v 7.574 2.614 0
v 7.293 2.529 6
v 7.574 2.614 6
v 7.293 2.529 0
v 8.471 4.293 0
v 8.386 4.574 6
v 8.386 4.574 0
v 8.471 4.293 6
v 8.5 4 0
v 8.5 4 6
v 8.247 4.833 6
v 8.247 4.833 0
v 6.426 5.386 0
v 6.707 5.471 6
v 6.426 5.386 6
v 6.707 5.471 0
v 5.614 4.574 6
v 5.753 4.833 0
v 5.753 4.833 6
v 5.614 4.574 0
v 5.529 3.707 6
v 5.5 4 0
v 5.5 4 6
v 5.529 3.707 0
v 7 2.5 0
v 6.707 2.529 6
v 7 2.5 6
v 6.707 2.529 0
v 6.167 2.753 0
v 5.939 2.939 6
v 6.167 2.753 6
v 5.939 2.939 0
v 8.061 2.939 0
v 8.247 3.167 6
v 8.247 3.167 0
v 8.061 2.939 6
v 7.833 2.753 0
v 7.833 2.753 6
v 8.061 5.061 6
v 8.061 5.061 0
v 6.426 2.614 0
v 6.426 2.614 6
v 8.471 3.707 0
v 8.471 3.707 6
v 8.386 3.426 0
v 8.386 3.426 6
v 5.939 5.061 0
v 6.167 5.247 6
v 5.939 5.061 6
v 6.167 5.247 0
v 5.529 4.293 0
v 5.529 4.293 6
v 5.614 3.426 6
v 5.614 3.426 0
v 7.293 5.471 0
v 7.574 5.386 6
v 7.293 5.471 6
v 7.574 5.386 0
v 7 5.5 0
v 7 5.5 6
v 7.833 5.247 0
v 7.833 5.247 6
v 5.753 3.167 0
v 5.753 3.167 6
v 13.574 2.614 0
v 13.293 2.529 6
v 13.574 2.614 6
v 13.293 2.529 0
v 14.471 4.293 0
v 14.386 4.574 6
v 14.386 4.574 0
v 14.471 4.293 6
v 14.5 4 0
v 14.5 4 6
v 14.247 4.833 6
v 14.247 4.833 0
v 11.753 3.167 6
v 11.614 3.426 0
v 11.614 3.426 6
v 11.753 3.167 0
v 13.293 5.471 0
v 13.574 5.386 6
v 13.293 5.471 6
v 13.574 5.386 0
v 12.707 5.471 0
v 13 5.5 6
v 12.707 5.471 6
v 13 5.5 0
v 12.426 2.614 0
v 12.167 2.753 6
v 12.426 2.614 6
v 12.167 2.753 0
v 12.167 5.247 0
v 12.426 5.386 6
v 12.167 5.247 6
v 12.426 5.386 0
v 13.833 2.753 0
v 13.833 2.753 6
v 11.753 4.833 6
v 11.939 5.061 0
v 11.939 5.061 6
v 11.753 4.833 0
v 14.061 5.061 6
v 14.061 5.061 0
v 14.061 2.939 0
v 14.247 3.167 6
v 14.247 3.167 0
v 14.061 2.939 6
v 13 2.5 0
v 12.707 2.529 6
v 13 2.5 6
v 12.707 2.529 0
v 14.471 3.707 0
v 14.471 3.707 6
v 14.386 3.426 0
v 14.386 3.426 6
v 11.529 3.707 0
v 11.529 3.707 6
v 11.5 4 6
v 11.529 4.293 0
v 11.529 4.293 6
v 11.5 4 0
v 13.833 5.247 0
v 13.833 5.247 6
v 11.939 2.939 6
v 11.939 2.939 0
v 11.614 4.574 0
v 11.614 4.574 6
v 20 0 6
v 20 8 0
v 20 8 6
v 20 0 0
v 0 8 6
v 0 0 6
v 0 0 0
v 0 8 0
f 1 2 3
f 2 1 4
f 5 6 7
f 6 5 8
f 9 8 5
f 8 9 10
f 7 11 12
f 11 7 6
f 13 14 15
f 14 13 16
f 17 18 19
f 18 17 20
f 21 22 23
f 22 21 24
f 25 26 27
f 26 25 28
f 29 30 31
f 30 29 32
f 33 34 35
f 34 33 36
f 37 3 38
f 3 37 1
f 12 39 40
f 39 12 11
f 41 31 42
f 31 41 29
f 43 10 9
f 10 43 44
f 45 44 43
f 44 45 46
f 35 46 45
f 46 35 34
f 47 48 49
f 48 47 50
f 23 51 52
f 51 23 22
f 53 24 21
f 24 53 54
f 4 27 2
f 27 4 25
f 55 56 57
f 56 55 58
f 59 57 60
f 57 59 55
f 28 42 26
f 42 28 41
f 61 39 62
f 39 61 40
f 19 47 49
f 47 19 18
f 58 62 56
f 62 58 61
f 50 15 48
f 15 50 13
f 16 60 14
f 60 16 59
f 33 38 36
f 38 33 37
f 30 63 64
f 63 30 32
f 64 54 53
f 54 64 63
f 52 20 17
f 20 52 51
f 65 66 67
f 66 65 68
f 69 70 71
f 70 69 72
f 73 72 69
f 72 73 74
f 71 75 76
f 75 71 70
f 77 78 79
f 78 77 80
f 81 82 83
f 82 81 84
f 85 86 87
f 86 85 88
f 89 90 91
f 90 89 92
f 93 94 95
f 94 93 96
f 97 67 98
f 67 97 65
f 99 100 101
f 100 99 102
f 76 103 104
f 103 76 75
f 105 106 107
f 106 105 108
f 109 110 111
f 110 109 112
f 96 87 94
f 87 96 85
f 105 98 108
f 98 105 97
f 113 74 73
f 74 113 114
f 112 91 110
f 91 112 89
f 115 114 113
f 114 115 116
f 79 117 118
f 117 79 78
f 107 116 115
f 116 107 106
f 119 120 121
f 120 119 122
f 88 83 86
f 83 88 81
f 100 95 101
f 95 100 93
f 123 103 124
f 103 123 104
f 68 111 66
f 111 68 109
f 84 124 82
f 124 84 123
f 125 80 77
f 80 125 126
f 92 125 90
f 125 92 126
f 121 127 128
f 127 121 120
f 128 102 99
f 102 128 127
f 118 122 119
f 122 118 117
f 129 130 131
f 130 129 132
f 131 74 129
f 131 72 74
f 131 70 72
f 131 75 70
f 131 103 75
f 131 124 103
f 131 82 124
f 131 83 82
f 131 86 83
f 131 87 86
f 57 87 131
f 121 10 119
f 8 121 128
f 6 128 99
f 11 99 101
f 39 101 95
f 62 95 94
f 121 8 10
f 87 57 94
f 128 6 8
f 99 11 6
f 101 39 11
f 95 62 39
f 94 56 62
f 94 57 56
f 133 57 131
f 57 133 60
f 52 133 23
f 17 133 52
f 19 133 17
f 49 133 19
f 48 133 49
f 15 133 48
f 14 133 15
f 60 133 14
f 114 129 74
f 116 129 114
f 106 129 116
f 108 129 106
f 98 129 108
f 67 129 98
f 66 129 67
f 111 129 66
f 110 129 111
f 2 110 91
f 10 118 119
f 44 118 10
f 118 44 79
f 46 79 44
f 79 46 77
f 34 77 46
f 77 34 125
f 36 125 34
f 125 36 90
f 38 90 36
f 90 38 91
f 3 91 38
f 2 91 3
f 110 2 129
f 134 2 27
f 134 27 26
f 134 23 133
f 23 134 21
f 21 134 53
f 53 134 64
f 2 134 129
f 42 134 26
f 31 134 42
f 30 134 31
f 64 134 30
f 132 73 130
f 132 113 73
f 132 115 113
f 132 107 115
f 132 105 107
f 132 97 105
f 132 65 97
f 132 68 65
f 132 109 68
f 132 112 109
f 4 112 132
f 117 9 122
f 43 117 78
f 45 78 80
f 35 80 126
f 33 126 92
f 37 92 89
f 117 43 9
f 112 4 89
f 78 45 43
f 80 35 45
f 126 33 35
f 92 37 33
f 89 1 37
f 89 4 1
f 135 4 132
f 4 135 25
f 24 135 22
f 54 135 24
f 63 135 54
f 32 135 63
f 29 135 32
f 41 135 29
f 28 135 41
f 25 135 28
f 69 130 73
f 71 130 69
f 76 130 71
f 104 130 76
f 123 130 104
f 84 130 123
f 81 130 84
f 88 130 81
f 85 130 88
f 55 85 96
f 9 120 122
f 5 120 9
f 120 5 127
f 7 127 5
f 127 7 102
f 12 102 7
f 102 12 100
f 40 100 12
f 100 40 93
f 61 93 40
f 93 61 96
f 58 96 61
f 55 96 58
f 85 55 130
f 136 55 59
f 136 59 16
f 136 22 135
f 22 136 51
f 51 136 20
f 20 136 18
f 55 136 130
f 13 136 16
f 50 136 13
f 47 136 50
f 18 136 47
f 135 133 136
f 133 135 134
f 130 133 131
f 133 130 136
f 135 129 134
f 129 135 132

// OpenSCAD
$fn = 32;

// ----------------------------------------------------------------------
// Micro pad: two-hole pad, 5-20 mm class
// ----------------------------------------------------------------------

// --- parameters (mm) ---
pad_l = 20;               // pad length, X
pad_w = 8;                // pad width, Y
pad_t = 6;                // pad thickness, Z
hole_d = 3;               // hole diameter
hole_x = 7;               // X of the first hole centre

difference() {
  cube([pad_l, pad_w, pad_t]);
  for (x = [hole_x, pad_l - hole_x])
    translate([x, pad_w / 2, -1])
      cylinder(h = pad_t + 2, d = hole_d);
}
